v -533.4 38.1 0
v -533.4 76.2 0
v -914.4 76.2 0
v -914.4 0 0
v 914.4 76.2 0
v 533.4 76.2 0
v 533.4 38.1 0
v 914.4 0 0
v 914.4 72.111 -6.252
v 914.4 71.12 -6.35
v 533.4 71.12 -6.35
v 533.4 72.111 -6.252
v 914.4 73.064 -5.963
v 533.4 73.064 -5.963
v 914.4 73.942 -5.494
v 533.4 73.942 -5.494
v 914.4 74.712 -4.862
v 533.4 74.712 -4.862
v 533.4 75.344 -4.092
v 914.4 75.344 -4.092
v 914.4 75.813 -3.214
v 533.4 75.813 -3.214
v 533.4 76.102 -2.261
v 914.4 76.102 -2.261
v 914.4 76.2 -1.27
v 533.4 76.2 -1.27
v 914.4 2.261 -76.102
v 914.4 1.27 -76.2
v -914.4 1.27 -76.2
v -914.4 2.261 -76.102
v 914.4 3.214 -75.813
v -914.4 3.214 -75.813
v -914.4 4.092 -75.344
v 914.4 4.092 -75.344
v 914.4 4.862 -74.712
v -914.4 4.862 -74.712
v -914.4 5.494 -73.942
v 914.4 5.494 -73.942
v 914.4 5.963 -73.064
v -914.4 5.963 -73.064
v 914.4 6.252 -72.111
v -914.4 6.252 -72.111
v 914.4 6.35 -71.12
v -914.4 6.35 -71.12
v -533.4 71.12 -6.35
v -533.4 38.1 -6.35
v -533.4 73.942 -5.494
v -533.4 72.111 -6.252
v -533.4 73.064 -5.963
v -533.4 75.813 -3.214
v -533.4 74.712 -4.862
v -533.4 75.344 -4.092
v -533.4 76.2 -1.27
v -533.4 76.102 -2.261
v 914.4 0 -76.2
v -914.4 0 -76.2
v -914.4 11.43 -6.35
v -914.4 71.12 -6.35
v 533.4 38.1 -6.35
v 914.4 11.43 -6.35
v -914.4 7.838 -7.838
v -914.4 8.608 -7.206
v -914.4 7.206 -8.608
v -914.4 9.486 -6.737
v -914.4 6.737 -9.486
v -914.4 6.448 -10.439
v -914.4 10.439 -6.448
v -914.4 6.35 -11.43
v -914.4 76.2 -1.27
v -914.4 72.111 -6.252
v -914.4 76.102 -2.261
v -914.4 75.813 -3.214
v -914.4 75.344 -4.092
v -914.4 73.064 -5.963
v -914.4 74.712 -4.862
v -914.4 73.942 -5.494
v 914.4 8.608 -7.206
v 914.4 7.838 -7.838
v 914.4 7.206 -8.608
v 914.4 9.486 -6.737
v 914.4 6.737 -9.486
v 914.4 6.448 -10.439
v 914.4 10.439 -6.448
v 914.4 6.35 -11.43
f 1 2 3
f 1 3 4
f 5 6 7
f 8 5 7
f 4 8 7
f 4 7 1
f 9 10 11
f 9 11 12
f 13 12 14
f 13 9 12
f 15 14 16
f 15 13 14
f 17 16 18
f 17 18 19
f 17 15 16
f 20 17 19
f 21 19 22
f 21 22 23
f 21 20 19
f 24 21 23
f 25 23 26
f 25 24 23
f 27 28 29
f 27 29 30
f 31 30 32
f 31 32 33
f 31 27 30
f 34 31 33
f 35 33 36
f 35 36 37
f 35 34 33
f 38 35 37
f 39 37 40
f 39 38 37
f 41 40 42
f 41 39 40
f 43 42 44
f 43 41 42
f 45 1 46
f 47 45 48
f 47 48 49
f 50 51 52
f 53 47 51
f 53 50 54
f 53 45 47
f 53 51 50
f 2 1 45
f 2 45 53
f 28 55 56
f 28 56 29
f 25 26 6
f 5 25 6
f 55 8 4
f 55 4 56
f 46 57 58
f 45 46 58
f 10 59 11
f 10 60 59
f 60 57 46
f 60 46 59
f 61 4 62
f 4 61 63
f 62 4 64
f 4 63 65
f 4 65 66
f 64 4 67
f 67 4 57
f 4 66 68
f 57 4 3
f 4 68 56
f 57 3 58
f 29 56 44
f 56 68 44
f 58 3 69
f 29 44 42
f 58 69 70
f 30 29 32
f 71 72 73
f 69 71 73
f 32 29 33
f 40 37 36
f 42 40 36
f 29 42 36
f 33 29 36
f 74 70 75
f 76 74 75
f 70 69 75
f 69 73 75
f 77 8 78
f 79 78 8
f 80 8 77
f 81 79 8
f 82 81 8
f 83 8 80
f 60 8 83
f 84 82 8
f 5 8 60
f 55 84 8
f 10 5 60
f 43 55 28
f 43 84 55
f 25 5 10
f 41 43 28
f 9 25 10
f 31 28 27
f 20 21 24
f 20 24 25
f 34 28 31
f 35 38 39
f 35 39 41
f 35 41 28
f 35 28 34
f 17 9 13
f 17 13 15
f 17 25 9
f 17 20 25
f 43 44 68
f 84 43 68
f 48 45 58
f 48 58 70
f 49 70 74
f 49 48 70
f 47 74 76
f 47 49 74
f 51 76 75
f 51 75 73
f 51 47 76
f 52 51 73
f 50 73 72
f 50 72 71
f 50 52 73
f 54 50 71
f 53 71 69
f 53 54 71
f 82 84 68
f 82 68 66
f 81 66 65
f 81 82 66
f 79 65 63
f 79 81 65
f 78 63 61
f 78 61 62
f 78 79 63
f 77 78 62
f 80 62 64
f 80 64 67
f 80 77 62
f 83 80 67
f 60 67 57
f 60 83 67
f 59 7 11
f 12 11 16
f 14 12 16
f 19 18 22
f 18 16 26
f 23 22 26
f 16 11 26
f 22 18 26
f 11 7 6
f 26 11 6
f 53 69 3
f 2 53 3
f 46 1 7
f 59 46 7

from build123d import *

# Parameters (mm, degrees)
BOSS_EXTRUDE1_DEPTH      = 914.4
BOSS_EXTRUDE1_DEPTH_BACK = 914.4
SKETCH2_W                = 1066.8
SKETCH2_H                = 38.1
CUT_EXTRUDE1_DEPTH       = 921.728103188


with BuildPart() as part:
    # Sketch1 → Boss-Extrude1 (new, two sides: drawn at the far end of the back side and taken through both)
    with BuildSketch(Plane(origin=(0, 0, 0), x_dir=(0, 0, -1), z_dir=(1, 0, 0)).offset(-BOSS_EXTRUDE1_DEPTH_BACK)):
        with BuildLine():
            Line((0, 76.2), (0, 0))
            Line((0, 0), (76.2, 0))
            Line((76.2, 0), (76.2, 1.27))
            ThreePointArc((76.2, 1.27), (74.712102448, 4.862102448), (71.12, 6.35))
            Line((71.12, 6.35), (11.43, 6.35))
            ThreePointArc((11.43, 6.35), (7.837897552, 7.837897552), (6.35, 11.43))
            Line((6.35, 11.43), (6.35, 71.12))
            ThreePointArc((6.35, 71.12), (4.862102448, 74.712102448), (1.27, 76.2))
            Line((1.27, 76.2), (0, 76.2))
        make_face()
    extrude(amount=BOSS_EXTRUDE1_DEPTH + BOSS_EXTRUDE1_DEPTH_BACK)

    # Sketch2 → Cut-Extrude1 (cut, through all)
    with BuildSketch(Plane.XY):
        with Locations((0, 57.15)):
            Rectangle(SKETCH2_W, SKETCH2_H)
    extrude(amount=-CUT_EXTRUDE1_DEPTH, mode=Mode.SUBTRACT)


solid = part.part
